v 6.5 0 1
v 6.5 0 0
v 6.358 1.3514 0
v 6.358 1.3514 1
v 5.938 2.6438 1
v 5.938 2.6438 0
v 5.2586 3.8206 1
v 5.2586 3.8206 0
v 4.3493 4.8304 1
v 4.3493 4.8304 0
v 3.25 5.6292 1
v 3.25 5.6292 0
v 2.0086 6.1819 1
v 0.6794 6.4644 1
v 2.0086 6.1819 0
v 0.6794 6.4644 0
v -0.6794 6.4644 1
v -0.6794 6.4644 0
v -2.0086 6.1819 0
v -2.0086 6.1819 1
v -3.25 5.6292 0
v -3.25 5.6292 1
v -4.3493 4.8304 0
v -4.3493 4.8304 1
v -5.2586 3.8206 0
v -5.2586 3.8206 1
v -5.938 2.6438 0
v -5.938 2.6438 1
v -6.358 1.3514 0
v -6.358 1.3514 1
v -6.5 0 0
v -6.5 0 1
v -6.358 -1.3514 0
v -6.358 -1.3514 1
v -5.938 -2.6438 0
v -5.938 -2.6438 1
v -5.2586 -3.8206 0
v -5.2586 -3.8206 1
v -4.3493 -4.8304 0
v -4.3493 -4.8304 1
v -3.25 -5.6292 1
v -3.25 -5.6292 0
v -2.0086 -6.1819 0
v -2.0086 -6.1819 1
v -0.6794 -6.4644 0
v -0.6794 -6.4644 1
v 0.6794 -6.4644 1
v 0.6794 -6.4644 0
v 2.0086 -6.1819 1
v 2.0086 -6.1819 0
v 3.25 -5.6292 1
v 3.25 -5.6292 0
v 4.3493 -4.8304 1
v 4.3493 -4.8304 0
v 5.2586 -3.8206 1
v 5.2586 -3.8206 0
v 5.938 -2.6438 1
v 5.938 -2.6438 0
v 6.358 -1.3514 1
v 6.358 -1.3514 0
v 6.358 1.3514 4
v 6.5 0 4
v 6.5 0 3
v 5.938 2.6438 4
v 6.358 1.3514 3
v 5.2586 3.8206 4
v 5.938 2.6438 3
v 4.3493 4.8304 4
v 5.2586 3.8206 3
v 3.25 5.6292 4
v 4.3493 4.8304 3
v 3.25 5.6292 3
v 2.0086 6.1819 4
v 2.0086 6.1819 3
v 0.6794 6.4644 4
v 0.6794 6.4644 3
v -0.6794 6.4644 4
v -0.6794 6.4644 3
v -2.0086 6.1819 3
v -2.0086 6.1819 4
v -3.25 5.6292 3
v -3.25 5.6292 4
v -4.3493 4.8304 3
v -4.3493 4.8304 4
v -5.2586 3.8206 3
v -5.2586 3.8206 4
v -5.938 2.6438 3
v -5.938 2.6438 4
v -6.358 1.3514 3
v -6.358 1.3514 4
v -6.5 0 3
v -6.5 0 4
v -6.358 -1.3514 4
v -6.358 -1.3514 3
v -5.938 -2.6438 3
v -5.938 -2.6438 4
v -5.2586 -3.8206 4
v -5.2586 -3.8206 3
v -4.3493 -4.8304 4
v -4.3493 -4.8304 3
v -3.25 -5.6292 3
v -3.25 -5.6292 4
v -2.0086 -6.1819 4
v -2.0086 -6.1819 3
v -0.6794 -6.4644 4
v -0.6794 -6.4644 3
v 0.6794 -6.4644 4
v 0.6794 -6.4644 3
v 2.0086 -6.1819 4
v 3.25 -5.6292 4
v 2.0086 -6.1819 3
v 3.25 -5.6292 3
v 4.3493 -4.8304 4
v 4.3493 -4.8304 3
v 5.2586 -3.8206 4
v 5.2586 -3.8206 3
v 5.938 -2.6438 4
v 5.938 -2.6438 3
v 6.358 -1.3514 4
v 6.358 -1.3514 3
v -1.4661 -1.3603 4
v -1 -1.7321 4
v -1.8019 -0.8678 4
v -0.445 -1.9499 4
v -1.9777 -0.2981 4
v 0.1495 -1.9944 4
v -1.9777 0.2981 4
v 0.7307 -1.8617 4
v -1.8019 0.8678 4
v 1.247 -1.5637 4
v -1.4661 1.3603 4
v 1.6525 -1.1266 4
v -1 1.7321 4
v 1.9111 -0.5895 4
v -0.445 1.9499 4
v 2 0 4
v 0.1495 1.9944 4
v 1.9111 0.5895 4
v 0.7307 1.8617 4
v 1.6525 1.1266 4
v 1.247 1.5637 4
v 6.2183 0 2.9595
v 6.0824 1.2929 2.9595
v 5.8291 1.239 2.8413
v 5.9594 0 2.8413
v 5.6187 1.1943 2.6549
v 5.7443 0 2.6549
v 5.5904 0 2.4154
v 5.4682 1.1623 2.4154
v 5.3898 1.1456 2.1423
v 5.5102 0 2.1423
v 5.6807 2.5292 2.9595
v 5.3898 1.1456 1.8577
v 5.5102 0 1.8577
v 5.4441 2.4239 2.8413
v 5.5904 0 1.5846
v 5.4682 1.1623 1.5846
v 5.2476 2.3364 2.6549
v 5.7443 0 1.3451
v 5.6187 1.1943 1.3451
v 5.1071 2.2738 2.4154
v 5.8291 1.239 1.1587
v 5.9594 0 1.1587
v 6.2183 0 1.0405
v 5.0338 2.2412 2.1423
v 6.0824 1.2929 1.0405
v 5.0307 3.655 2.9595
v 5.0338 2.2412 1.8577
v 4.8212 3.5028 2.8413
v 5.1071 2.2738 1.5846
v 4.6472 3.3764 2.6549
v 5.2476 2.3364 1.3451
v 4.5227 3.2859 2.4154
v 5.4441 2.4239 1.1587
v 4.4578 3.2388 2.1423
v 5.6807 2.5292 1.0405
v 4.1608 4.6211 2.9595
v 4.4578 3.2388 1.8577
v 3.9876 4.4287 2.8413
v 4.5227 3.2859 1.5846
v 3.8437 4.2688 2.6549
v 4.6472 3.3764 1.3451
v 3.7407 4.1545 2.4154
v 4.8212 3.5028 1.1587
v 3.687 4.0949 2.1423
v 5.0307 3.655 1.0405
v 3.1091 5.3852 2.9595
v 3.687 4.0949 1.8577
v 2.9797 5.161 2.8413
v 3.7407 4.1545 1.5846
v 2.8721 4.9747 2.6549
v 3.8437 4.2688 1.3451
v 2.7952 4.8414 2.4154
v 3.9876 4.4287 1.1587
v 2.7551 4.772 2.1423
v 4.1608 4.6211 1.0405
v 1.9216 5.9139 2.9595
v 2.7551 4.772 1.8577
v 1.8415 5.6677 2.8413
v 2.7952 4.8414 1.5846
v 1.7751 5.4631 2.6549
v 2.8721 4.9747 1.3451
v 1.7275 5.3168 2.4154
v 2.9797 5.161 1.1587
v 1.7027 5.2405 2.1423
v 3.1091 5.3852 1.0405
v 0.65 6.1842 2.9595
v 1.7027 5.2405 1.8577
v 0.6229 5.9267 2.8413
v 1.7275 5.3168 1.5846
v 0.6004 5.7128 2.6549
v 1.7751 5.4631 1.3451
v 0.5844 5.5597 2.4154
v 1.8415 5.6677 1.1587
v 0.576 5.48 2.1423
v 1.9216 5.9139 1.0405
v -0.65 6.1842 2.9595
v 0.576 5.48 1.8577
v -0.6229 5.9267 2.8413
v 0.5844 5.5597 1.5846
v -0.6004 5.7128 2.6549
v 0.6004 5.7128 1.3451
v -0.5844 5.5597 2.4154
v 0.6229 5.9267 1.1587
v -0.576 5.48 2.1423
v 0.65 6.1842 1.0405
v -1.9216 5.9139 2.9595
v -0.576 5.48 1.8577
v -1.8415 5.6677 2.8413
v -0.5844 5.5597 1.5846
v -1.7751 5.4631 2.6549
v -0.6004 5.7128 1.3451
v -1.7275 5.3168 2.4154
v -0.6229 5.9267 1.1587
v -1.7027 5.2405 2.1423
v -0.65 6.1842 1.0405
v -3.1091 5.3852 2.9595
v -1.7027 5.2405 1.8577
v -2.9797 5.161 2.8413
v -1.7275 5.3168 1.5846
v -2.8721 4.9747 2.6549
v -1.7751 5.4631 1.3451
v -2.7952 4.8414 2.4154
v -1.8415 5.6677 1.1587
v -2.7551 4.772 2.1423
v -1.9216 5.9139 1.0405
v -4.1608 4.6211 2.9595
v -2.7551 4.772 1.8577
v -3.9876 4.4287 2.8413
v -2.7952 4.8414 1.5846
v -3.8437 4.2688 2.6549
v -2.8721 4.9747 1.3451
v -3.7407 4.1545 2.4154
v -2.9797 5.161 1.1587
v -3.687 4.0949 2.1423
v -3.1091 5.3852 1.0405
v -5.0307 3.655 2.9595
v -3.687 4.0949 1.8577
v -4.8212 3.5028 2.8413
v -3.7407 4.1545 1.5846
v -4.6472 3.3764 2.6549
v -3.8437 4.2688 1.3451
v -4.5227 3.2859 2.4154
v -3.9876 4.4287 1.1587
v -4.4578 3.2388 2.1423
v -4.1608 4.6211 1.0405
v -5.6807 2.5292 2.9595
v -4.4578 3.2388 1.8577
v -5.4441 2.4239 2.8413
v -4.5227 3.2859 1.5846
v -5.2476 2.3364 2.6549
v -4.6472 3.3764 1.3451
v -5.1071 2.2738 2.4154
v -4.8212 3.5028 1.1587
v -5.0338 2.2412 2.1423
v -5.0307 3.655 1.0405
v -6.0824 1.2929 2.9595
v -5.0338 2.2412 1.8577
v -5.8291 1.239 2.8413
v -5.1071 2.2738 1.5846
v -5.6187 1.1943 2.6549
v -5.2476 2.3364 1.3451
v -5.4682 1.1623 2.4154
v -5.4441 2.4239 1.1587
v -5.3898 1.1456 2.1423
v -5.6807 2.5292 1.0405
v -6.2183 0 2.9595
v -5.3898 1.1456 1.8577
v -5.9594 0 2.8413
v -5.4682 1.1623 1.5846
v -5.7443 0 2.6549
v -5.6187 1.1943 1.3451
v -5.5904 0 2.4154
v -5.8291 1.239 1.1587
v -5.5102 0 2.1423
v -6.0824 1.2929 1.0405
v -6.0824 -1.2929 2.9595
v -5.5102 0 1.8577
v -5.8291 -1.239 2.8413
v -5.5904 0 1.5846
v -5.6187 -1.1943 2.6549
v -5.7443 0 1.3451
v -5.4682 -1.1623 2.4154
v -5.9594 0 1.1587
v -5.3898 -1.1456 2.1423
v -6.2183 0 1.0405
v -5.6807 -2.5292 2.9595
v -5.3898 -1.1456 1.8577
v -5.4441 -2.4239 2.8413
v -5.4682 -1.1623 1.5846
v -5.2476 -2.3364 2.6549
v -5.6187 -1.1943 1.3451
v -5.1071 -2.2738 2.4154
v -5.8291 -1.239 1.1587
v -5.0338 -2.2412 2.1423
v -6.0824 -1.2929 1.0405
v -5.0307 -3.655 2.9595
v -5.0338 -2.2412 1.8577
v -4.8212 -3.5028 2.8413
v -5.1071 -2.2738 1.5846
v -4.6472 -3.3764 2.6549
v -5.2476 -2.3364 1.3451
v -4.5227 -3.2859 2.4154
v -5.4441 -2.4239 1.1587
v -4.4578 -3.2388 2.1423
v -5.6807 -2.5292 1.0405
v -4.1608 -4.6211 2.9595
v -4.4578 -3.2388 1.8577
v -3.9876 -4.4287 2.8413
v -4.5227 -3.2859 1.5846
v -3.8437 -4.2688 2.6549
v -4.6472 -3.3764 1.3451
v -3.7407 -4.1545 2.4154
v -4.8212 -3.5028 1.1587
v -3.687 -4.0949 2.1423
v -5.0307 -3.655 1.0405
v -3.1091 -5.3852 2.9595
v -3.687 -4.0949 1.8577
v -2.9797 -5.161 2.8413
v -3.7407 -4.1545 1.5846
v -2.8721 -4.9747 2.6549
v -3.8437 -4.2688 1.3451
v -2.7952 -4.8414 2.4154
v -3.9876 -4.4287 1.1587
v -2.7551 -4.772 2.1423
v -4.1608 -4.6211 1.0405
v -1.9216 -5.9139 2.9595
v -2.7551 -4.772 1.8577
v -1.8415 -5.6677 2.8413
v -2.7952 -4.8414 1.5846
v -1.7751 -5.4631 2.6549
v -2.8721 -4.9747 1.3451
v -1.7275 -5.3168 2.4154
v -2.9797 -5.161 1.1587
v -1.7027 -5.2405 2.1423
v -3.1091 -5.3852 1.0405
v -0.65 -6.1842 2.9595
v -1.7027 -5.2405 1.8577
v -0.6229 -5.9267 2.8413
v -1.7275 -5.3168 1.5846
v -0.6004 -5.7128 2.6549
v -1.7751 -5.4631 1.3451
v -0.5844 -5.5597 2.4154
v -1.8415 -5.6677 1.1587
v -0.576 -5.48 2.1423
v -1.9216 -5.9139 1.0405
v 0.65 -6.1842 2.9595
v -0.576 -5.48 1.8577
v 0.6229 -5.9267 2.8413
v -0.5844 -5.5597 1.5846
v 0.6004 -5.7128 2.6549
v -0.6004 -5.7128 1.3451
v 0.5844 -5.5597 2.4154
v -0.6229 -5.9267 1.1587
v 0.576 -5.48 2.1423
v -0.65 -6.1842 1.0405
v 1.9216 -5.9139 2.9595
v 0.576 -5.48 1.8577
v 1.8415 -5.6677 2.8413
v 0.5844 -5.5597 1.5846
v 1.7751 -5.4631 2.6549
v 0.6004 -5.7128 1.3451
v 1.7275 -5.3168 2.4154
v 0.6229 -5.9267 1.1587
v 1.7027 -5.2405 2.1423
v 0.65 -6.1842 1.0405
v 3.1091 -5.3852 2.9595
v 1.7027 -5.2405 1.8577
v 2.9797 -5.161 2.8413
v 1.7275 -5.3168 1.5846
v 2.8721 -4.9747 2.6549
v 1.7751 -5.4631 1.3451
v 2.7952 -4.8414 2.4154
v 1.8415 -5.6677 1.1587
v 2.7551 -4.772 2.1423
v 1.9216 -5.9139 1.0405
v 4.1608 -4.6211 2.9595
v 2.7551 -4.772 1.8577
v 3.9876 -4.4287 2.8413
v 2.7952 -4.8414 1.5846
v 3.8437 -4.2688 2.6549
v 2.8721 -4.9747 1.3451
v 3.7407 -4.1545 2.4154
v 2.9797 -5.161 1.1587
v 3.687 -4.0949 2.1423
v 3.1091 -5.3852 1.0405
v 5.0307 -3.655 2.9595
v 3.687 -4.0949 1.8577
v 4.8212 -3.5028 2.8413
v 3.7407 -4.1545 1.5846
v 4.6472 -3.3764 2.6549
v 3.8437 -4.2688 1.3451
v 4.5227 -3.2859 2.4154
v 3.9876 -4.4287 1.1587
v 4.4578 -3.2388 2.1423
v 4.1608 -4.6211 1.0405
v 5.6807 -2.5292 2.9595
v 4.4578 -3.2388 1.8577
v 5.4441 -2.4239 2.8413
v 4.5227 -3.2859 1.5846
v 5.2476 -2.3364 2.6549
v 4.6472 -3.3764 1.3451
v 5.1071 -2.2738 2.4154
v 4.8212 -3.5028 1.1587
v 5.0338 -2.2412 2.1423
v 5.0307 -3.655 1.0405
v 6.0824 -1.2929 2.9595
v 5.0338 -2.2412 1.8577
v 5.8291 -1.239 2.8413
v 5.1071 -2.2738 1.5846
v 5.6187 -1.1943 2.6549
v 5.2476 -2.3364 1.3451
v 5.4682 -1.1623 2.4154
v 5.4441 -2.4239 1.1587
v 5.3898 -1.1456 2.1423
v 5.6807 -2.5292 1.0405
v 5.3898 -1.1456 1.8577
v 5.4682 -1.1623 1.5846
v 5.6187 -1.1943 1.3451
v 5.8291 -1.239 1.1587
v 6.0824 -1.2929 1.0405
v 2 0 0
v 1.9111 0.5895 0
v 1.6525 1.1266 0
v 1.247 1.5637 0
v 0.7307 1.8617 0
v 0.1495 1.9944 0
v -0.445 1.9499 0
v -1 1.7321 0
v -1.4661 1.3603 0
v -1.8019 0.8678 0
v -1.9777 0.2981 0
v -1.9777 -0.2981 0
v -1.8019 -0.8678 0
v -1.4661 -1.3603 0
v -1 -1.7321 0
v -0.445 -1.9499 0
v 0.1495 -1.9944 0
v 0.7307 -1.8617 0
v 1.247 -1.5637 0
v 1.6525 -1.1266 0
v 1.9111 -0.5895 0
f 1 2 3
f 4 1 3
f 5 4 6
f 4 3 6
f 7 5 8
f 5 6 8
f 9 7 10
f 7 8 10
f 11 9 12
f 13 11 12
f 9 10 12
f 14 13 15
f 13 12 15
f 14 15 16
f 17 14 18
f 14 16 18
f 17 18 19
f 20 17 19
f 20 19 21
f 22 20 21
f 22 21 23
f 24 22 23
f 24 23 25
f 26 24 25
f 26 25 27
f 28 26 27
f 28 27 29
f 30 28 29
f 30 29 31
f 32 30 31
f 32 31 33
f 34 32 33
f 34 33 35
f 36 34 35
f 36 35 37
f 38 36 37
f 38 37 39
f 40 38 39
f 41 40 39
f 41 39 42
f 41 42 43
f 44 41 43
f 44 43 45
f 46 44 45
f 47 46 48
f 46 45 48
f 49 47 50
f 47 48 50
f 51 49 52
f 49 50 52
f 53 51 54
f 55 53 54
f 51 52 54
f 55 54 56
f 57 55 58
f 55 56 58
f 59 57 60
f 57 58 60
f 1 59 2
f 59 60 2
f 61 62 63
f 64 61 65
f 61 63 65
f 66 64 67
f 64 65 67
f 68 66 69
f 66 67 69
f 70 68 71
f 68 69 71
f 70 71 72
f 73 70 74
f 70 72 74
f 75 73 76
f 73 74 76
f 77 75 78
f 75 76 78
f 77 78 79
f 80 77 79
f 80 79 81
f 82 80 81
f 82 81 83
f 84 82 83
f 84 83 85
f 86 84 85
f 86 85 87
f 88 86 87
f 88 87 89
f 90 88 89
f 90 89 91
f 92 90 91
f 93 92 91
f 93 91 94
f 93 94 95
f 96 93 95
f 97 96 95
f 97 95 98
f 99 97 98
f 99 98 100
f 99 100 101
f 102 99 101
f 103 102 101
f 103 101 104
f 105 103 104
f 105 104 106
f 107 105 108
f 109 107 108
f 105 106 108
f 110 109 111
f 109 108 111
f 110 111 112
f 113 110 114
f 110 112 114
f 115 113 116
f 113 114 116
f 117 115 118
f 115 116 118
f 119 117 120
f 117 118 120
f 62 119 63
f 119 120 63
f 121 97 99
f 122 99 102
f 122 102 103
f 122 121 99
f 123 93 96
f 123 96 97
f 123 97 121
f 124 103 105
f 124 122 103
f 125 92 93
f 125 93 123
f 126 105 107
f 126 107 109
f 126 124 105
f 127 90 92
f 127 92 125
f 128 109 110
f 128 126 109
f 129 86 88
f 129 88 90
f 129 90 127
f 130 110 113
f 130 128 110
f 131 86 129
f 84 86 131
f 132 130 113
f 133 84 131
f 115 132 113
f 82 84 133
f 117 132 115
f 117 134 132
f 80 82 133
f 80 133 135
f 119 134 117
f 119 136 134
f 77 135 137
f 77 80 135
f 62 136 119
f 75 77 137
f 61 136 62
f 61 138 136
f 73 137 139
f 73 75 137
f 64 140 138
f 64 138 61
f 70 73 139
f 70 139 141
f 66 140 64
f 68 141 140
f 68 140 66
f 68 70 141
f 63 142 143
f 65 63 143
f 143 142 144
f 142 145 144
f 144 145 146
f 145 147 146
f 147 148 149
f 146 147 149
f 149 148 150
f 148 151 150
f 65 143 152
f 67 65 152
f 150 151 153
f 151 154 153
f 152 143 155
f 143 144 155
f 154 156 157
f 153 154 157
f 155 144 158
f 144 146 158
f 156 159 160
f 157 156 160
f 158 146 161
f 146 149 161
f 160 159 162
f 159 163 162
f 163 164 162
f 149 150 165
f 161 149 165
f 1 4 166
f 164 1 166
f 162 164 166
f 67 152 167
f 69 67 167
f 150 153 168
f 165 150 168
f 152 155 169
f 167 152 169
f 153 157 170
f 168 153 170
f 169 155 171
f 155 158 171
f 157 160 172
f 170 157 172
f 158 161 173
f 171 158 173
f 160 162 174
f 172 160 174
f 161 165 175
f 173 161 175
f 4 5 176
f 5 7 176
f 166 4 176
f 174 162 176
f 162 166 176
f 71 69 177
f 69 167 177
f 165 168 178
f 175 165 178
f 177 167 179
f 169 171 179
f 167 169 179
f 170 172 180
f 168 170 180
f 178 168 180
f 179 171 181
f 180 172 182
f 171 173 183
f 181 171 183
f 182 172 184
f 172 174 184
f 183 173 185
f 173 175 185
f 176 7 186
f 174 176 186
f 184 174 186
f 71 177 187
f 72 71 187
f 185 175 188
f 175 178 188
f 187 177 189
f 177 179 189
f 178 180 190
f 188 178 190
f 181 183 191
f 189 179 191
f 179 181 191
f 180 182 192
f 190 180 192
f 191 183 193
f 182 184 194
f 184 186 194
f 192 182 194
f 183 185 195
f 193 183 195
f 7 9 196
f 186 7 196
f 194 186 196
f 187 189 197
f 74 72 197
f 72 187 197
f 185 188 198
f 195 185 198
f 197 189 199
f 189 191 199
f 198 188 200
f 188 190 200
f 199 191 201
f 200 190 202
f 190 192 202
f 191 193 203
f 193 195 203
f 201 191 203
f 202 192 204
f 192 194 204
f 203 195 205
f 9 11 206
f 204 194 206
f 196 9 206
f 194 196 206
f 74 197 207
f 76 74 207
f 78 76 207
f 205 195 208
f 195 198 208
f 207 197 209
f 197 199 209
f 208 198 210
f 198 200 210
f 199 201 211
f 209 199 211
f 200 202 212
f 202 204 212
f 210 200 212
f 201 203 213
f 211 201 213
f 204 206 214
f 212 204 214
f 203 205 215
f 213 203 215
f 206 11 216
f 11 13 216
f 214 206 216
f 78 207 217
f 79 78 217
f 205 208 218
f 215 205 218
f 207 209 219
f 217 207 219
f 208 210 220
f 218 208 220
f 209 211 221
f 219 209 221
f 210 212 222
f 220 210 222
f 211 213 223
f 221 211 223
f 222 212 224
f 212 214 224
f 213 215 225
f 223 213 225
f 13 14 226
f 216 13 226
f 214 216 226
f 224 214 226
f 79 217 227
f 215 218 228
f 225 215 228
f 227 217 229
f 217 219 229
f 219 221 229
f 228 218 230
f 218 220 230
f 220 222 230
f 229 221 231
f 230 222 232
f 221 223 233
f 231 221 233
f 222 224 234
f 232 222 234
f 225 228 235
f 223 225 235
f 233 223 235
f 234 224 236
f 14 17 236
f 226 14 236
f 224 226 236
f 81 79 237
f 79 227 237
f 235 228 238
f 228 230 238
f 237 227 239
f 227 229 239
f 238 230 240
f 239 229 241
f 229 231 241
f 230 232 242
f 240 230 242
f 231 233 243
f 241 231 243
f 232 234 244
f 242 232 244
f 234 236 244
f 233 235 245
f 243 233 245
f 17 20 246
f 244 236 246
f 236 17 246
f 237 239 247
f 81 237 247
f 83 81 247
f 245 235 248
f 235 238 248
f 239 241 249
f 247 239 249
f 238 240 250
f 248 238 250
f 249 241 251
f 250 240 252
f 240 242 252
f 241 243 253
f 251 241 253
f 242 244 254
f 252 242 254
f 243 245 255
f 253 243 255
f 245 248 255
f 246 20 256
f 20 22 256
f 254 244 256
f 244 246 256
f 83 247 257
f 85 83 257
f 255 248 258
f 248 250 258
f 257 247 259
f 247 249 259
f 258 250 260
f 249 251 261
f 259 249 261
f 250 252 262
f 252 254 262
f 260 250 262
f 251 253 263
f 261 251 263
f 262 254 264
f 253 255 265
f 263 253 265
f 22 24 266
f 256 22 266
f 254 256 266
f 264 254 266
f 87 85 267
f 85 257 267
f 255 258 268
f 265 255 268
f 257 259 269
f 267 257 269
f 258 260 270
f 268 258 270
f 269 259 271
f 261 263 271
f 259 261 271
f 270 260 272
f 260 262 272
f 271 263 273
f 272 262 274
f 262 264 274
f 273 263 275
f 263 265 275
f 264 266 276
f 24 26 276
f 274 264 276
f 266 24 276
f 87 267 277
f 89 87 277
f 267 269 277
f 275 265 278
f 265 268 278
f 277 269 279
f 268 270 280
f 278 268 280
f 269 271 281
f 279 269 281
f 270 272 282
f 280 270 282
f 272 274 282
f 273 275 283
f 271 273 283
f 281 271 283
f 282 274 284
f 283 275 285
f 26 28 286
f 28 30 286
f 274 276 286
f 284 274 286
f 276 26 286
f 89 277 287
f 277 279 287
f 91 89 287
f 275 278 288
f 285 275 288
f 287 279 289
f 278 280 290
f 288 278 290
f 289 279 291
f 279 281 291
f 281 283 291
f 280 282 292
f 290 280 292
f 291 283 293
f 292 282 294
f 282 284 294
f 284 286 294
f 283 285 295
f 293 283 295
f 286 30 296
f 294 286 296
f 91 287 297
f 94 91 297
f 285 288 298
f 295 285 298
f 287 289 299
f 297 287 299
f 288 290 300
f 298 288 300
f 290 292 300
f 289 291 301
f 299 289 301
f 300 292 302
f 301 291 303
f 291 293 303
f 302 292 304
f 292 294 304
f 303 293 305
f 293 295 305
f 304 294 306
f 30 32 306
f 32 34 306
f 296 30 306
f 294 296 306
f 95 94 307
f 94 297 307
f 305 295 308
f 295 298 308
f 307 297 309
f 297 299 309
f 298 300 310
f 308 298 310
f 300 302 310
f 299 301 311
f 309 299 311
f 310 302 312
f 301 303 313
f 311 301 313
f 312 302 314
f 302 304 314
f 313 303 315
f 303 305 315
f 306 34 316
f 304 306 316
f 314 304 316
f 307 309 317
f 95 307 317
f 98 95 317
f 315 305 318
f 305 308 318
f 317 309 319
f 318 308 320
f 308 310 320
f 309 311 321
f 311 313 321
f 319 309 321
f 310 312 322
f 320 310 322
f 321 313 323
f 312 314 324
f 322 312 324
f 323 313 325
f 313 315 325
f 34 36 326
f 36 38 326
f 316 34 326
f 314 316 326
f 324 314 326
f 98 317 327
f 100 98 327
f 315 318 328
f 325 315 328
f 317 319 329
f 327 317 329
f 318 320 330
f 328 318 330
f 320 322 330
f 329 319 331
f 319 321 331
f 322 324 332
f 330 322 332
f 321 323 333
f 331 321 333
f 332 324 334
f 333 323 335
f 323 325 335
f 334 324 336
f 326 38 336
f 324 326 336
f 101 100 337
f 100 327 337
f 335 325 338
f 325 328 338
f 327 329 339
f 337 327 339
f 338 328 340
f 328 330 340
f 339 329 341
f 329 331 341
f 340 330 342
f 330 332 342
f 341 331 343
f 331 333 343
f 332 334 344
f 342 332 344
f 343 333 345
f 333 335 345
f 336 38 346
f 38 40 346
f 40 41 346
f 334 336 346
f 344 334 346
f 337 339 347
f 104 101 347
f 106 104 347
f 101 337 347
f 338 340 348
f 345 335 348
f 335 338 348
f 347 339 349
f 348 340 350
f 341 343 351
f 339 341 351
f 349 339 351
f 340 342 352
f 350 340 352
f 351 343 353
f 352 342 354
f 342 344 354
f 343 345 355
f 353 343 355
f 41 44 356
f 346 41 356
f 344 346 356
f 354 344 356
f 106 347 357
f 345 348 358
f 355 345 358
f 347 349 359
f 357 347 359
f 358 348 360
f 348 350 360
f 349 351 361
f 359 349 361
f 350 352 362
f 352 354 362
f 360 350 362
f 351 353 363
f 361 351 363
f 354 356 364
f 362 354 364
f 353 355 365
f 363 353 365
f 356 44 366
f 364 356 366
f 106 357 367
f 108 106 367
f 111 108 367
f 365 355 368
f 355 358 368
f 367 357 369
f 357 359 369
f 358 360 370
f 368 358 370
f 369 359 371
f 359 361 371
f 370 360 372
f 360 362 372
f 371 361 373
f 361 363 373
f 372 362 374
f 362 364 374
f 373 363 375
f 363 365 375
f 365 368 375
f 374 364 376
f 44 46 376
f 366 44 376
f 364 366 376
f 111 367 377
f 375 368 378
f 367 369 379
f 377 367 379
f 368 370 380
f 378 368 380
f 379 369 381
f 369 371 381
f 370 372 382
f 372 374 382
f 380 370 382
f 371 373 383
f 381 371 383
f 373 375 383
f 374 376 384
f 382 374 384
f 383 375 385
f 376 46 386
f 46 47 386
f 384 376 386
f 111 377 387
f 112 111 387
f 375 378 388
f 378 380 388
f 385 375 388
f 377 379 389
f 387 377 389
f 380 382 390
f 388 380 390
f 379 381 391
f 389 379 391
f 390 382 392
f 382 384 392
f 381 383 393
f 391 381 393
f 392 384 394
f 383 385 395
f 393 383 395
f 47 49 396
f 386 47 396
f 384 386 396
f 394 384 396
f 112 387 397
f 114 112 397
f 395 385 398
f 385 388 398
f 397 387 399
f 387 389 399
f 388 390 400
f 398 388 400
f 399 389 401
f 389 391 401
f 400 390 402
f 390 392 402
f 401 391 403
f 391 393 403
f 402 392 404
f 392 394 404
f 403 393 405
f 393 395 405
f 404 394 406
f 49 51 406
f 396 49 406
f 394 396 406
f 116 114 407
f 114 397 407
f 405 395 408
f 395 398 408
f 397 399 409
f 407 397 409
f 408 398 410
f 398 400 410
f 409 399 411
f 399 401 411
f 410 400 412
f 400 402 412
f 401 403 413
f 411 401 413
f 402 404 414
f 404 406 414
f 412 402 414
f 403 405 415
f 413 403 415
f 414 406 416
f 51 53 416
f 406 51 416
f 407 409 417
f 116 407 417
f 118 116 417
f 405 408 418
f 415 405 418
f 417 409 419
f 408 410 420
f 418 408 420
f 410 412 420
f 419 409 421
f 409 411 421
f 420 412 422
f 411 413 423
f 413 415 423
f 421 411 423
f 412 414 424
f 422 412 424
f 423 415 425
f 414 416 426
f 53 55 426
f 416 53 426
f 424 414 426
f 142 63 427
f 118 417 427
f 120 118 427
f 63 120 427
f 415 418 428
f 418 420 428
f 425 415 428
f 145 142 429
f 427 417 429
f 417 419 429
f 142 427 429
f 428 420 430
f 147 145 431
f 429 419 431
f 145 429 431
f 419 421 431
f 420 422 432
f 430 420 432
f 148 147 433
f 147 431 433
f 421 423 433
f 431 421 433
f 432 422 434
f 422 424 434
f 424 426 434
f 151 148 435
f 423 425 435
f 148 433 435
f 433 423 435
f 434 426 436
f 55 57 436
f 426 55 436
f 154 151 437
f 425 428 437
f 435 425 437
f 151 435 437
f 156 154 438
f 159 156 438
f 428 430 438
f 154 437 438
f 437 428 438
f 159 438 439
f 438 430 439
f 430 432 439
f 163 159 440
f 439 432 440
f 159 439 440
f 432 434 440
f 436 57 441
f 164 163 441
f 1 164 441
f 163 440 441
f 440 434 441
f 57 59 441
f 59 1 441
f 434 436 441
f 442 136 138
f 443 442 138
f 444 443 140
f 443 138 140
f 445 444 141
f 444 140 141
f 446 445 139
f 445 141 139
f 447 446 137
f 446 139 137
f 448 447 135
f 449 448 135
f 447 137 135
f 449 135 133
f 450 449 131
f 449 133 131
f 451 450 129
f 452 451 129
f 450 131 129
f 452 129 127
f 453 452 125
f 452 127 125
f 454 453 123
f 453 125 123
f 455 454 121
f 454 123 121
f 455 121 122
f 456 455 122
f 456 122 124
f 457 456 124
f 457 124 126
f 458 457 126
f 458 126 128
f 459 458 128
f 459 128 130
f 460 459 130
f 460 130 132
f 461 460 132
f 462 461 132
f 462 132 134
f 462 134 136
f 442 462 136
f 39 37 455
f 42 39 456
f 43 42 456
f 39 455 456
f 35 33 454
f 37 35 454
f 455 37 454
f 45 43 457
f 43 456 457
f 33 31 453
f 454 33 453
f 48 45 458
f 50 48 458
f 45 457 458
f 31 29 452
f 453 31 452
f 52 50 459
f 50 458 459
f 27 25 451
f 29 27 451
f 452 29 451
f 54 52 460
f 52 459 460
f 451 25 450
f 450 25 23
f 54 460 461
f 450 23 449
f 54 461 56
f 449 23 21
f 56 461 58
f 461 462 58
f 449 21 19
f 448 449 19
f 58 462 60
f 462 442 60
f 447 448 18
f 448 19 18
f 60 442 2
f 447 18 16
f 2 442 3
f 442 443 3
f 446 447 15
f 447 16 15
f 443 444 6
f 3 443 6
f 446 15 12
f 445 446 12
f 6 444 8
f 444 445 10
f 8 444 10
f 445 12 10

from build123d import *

# Parameters (mm, degrees)
SKETCH1_R           = 6.5
BOSS_EXTRUDE1_DEPTH = 4
SKETCH2_R           = 2
CUT_EXTRUDE1_DEPTH  = 5
SKETCH4_R           = 1


with BuildPart() as part:
    # Sketch1 → Boss-Extrude1 (new body)
    with BuildSketch(Plane.XY):
        Circle(SKETCH1_R)
    extrude(amount=BOSS_EXTRUDE1_DEPTH)

    # Sketch2 → Cut-Extrude1 (cut, through all)
    with BuildSketch(Plane.XY.offset(4)):
        Circle(SKETCH2_R)
    extrude(amount=-CUT_EXTRUDE1_DEPTH, mode=Mode.SUBTRACT)

    # Cut-Sweep1: sweep along a path in Sketch3
    with BuildLine(Plane.XY.offset(2)) as cut_sweep1_path:
        CenterArc((0, 0), 6.5, 0, 360)
    # Sketch4 → Cut-Sweep1 (sweep, cut)
    with BuildSketch(Plane(origin=(0, 0, 0), x_dir=(0, 0, -1), z_dir=(1, 0, 0))):
        with Locations((-2, 6.5)):
            Circle(SKETCH4_R)
    sweep(path=cut_sweep1_path.line, mode=Mode.SUBTRACT)


solid = part.part
